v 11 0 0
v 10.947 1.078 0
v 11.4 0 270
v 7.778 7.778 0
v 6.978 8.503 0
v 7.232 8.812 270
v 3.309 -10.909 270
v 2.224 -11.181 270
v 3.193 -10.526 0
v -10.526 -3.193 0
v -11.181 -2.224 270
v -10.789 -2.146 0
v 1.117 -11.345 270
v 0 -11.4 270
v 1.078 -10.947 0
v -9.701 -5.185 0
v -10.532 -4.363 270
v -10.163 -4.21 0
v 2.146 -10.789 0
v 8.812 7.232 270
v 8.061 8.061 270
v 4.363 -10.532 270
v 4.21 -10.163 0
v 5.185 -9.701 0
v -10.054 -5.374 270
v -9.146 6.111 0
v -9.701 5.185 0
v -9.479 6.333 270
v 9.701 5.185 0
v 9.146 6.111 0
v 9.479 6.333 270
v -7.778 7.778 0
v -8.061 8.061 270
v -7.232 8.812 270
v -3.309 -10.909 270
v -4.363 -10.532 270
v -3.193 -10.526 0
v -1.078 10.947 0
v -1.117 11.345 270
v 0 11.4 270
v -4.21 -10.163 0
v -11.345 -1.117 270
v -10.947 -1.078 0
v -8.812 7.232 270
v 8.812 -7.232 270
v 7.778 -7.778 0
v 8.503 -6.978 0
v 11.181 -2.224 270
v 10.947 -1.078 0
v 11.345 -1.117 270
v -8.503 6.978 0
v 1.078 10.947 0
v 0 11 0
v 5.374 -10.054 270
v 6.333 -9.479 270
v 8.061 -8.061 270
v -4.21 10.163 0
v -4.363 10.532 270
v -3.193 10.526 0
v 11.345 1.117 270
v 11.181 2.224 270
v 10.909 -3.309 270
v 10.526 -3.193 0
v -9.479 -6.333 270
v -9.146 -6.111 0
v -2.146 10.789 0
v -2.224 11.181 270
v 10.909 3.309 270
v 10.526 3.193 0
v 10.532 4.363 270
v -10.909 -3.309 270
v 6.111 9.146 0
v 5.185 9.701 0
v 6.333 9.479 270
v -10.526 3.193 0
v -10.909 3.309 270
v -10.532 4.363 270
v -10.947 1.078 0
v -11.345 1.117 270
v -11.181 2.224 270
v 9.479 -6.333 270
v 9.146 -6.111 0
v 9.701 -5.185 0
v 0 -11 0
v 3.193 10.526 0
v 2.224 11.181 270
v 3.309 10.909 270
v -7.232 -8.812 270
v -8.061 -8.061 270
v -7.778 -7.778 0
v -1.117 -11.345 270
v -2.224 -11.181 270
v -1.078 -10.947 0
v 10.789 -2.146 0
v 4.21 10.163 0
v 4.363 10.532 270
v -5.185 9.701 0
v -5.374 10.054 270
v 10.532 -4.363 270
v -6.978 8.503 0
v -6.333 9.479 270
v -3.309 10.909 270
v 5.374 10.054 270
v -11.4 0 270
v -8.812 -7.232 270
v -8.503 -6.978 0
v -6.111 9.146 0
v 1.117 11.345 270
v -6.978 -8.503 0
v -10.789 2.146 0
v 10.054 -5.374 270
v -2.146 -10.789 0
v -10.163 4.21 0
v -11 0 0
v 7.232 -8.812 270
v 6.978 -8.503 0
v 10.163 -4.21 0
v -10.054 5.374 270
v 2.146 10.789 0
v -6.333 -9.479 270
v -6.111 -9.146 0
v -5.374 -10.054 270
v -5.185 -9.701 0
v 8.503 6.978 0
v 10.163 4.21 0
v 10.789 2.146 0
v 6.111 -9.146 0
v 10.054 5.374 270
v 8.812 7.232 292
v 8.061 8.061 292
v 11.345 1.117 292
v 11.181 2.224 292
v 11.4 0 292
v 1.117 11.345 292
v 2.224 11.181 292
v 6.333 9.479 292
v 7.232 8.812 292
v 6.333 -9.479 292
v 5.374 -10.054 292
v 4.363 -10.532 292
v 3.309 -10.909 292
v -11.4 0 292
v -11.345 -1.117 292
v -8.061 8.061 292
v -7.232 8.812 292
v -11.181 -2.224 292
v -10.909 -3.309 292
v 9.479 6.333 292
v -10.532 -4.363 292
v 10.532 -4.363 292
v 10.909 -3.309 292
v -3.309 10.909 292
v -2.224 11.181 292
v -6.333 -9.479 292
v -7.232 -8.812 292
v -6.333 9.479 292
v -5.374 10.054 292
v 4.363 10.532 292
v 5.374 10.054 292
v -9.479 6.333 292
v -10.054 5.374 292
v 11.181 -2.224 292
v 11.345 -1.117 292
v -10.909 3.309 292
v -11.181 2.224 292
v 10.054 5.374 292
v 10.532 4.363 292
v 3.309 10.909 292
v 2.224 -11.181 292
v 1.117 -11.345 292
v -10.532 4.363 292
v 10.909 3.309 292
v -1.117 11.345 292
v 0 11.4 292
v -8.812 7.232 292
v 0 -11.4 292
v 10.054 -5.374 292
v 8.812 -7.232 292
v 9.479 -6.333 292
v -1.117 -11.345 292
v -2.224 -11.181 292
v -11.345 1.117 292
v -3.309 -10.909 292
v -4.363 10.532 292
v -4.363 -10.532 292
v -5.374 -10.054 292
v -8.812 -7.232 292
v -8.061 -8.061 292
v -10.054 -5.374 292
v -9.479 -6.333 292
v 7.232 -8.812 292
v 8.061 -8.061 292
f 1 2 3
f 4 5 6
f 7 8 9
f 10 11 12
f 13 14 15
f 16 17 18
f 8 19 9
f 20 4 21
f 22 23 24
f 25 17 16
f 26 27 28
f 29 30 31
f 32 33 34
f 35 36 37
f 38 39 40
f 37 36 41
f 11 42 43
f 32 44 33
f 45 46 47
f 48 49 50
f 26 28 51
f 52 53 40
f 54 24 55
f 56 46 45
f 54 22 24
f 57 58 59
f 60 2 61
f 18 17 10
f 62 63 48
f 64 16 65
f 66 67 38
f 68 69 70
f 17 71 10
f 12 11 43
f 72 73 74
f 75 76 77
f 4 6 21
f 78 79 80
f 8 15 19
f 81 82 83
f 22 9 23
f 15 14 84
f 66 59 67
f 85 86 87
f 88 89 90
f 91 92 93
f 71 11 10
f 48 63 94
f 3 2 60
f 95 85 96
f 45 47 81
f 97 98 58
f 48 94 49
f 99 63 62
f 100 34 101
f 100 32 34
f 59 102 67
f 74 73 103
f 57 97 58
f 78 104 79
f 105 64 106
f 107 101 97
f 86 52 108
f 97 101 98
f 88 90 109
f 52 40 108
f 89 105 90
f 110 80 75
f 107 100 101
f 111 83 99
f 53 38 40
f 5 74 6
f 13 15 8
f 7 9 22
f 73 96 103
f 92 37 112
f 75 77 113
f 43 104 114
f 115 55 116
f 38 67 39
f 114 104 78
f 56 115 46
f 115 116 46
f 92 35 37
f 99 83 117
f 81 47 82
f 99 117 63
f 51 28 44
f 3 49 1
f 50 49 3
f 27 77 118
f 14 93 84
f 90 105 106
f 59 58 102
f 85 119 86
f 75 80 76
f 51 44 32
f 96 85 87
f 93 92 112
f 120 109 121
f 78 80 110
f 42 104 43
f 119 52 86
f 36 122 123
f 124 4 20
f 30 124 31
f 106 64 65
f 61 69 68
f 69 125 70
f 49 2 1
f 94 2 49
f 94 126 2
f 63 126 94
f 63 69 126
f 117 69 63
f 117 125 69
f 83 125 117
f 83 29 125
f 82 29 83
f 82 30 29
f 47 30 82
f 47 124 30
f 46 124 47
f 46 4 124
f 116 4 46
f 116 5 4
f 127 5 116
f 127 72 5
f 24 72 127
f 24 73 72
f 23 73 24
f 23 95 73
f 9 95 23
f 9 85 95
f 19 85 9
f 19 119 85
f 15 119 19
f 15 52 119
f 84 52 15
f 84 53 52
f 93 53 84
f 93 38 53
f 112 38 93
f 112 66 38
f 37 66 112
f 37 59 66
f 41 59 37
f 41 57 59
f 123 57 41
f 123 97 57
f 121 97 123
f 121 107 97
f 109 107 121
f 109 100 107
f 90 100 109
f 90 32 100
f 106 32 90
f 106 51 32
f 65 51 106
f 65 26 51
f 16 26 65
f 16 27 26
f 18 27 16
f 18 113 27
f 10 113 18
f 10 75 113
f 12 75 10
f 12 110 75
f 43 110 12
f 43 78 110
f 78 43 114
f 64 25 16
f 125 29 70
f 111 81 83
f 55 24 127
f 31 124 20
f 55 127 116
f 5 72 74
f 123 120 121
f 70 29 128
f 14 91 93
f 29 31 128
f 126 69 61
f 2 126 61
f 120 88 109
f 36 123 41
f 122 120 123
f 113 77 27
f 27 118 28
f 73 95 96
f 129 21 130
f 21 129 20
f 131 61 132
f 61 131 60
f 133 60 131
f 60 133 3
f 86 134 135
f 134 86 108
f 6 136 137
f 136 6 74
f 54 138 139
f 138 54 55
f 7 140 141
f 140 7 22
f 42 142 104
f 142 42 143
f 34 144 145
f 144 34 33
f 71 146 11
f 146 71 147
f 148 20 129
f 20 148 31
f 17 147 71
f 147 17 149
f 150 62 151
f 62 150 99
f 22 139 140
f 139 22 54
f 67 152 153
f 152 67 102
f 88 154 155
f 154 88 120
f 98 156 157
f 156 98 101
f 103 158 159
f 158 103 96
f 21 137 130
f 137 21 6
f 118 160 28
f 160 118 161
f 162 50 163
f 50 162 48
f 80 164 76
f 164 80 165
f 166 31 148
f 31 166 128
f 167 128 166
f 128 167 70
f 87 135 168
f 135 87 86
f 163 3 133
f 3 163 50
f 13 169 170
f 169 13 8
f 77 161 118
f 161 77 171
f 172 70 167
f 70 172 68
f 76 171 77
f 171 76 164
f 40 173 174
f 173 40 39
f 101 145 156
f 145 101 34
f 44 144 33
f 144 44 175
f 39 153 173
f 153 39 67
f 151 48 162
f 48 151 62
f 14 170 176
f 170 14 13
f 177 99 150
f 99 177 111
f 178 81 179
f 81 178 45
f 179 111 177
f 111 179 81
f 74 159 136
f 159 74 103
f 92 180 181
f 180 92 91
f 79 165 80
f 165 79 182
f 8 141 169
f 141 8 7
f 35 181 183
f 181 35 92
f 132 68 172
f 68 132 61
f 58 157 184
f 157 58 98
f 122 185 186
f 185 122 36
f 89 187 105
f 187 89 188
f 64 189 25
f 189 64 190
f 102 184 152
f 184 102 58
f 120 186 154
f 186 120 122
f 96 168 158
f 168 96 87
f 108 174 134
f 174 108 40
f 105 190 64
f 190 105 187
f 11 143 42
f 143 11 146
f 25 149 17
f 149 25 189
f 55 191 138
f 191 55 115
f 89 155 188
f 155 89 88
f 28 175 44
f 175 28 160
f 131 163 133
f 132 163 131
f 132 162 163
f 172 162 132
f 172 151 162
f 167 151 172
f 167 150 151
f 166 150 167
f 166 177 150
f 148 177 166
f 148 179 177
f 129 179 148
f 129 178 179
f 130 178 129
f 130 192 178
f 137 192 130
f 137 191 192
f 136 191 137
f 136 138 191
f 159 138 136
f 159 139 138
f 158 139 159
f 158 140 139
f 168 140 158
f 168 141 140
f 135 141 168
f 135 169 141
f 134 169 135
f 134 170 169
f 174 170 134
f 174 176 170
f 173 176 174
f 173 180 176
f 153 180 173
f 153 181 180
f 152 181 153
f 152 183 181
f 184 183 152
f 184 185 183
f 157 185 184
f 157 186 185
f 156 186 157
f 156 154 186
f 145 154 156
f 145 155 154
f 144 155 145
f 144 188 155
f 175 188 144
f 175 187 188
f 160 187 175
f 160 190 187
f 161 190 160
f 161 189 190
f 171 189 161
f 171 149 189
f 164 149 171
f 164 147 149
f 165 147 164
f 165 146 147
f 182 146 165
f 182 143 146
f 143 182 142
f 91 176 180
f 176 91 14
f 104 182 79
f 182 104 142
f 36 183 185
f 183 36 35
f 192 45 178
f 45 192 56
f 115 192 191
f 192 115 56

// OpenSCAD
// Syringe Prop Colored Insert
// And cane extension

$fn = 64;

insert_dia = 17.8;
insert_len = 96.0;

//linear_extrude(96.0)
//circle(d=insert_dia);

cane_ext = 270.0;
cane_dia = 22.0;
overlap_dist = cane_dia;
line_thick = 0.8;

cylinder(d1=cane_dia, d2=cane_dia+line_thick, h=cane_ext);
translate([0,0,cane_ext])
cylinder(d=cane_dia+line_thick, h=overlap_dist);
